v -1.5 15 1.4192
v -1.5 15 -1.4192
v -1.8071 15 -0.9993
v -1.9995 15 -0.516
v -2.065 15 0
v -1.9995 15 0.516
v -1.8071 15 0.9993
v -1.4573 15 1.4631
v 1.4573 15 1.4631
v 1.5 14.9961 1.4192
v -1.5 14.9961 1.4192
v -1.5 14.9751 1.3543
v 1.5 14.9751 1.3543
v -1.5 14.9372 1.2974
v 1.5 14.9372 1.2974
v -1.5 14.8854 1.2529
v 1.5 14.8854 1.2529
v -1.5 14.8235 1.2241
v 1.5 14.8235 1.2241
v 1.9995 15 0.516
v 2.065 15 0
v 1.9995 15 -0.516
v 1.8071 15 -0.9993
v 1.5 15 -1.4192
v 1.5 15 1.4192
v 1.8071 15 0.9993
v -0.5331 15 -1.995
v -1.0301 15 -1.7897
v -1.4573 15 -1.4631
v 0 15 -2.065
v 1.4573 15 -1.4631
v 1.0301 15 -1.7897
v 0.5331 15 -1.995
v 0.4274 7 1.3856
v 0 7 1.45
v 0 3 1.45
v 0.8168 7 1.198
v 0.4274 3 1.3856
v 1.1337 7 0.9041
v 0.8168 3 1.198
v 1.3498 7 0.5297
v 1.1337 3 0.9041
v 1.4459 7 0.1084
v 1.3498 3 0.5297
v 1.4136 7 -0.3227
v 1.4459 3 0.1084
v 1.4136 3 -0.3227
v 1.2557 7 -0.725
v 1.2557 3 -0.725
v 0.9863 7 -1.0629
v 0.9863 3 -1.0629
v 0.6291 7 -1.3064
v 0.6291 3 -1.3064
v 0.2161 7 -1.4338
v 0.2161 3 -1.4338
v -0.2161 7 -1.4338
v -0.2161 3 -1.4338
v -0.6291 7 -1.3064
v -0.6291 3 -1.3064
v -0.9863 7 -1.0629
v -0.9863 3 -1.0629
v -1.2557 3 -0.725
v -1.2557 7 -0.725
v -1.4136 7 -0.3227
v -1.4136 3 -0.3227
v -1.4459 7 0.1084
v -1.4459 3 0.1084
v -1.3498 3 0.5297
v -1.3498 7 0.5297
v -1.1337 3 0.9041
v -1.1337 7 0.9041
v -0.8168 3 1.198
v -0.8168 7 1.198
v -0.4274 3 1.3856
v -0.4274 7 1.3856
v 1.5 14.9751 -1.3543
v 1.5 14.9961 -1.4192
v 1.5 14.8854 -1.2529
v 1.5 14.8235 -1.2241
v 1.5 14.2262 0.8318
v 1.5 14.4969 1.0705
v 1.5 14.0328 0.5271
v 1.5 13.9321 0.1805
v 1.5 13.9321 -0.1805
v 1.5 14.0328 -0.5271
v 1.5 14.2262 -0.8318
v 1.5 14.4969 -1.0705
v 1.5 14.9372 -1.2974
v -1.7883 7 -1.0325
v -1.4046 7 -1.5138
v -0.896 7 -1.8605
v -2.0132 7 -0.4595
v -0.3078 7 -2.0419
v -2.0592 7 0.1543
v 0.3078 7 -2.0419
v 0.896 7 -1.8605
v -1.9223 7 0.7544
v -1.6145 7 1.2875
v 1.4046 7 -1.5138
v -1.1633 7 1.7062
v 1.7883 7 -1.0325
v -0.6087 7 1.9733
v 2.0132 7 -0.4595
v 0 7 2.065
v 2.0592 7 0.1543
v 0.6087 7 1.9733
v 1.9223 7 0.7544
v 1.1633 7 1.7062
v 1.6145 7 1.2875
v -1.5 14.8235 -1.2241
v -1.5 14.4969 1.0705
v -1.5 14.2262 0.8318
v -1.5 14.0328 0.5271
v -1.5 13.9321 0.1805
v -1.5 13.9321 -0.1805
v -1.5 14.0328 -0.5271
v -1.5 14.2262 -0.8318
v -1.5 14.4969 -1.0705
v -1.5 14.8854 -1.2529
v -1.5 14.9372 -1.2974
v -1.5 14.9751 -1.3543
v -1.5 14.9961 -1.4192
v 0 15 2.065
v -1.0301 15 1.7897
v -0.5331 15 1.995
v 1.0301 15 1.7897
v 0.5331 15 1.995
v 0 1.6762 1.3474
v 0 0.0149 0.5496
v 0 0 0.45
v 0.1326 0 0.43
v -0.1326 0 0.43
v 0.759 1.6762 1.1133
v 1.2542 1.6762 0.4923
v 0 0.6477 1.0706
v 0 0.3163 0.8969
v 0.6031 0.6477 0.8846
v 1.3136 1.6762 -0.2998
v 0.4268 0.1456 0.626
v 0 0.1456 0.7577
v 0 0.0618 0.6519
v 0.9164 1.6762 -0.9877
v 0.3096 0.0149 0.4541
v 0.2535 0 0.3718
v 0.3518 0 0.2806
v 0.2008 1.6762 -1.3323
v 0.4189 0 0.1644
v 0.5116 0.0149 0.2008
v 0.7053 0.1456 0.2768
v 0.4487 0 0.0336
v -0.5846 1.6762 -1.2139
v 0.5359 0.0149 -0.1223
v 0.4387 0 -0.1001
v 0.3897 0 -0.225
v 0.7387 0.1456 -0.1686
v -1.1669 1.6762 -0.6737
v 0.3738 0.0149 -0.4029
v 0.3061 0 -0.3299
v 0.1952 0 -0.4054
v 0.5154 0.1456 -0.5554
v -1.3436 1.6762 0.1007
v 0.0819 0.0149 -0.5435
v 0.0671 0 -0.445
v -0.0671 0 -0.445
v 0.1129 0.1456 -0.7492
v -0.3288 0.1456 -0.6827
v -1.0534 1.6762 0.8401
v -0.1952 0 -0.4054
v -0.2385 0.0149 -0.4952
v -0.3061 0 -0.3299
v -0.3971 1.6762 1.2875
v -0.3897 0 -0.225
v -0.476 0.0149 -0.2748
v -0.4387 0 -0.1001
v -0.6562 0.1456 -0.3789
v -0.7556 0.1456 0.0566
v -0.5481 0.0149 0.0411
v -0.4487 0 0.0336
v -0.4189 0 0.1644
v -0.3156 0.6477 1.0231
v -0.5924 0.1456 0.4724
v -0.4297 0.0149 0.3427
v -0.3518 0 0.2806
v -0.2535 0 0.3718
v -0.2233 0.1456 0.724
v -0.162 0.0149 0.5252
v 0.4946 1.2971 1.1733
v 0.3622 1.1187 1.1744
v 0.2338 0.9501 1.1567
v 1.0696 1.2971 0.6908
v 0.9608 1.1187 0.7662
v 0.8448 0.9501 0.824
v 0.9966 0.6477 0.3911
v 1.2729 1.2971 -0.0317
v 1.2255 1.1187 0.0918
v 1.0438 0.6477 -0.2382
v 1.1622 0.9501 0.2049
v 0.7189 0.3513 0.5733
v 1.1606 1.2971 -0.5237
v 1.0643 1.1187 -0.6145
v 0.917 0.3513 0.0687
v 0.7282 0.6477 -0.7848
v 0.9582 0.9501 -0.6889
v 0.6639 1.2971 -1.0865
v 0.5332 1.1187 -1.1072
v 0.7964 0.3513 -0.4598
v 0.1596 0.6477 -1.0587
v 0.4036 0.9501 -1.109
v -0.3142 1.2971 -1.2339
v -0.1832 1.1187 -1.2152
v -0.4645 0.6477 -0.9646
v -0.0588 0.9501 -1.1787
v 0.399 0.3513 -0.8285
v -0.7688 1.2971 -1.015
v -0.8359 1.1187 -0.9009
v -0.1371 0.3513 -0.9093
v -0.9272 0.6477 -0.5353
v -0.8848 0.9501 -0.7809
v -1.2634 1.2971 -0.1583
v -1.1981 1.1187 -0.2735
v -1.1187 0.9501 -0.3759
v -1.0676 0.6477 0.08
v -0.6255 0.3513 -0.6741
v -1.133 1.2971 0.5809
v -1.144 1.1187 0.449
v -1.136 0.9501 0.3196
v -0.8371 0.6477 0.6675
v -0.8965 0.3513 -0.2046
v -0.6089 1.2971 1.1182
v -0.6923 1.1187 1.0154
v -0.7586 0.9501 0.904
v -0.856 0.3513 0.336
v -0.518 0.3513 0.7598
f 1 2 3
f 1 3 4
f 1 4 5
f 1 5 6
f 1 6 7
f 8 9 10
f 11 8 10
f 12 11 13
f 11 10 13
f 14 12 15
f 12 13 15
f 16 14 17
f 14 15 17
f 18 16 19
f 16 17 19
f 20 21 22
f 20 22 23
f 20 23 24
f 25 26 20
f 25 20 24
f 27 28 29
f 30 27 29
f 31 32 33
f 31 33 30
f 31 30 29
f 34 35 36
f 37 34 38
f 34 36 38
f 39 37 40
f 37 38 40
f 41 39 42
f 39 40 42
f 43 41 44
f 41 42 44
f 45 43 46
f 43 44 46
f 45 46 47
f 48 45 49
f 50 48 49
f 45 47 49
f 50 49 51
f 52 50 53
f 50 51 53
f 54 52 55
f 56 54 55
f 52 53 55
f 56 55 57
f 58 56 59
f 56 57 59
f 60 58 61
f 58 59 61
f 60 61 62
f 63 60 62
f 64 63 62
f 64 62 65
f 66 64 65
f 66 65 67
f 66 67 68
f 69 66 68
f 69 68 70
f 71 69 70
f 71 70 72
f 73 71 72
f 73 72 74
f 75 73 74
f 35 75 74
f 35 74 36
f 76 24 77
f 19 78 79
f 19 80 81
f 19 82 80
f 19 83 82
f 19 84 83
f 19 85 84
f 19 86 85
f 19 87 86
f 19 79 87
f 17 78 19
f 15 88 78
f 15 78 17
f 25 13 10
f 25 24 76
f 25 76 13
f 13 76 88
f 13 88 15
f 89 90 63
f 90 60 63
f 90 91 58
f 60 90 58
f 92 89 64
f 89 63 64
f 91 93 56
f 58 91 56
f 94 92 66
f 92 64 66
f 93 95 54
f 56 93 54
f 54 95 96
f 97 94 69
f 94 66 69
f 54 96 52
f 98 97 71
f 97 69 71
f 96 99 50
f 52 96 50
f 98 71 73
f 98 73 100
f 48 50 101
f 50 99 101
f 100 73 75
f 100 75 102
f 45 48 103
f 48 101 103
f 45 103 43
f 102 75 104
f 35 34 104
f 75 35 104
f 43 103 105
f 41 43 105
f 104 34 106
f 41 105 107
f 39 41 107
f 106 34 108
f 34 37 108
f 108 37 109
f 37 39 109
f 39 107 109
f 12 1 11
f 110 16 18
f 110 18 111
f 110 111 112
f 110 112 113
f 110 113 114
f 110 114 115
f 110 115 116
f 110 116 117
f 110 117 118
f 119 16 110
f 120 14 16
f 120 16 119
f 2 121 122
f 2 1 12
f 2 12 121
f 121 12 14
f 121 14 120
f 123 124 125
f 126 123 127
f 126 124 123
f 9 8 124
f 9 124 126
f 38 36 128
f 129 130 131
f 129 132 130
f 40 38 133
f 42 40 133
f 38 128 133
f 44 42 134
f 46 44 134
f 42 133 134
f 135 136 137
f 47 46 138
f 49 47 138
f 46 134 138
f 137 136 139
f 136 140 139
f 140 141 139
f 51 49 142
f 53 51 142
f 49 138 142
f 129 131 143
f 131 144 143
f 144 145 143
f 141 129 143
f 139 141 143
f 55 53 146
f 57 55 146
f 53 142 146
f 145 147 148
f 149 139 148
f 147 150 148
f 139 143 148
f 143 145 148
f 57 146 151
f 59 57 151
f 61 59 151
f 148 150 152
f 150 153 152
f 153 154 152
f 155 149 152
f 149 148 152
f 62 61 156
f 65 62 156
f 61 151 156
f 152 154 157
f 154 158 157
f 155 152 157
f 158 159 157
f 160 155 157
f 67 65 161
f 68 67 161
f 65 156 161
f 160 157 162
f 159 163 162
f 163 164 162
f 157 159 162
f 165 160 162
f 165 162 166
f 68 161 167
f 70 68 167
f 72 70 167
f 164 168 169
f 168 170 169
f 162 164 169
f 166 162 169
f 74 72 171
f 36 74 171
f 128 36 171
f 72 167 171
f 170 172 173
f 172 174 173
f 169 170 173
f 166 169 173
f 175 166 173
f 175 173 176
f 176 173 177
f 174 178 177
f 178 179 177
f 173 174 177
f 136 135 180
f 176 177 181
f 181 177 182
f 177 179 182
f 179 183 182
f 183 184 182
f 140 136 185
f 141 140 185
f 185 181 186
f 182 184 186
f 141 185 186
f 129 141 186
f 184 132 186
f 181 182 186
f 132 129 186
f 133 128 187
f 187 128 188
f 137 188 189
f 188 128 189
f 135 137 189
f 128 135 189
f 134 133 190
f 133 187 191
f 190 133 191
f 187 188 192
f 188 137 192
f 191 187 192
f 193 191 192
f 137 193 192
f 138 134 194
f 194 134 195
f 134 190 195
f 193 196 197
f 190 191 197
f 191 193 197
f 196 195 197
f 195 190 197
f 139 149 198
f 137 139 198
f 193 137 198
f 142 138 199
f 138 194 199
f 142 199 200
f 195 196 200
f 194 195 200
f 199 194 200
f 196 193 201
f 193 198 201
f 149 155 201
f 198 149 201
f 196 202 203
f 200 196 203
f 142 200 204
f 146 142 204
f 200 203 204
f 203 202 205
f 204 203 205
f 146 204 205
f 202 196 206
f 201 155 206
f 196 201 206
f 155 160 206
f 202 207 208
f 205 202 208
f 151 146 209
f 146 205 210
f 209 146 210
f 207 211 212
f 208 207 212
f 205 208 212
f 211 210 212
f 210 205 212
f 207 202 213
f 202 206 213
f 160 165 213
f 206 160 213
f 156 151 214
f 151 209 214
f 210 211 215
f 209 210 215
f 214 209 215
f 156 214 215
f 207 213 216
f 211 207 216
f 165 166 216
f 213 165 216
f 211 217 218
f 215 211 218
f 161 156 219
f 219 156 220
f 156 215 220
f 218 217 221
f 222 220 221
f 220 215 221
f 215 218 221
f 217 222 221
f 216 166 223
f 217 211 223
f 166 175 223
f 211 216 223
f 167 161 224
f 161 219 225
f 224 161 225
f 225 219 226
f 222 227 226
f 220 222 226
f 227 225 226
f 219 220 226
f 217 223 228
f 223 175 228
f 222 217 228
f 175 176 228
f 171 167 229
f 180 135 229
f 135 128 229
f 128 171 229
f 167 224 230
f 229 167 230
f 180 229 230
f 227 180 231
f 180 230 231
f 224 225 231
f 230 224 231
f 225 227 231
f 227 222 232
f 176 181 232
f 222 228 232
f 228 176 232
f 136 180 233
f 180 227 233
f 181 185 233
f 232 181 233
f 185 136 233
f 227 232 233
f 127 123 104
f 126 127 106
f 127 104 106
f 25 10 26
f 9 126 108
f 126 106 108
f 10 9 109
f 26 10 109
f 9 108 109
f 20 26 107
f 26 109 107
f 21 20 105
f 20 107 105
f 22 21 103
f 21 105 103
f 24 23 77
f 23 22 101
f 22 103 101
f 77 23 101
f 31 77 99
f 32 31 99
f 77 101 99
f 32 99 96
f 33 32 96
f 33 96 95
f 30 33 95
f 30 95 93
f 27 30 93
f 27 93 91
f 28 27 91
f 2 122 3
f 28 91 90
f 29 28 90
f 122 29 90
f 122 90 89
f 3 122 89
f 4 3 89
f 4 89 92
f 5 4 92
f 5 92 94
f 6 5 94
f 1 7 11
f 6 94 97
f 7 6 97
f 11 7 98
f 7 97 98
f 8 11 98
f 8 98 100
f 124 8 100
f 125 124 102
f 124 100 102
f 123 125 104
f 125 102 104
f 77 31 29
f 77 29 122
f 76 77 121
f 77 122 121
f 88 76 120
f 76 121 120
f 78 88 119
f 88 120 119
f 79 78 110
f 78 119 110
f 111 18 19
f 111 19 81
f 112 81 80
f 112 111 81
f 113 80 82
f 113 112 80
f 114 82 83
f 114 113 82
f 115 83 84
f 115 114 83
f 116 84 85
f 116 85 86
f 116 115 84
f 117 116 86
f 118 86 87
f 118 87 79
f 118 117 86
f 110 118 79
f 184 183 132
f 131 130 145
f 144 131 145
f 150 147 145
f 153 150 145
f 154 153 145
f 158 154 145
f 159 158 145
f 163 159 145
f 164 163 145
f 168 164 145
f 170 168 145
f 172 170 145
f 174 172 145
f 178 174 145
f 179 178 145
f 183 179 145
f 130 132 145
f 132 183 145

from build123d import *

# Parameters (mm, degrees)
SKETCH1_R               = 1.45
BOSS_EXTRUDE1_DEPTH     = 7
SKETCH3_R               = 2.065
BOSS_EXTRUDE3_DEPTH     = 8
FILLET1_SIZE            = 3
FILLET1_SIZE_2          = 1
CUT_EXTRUDE1_DEPTH      = 1.5
CUT_EXTRUDE1_DEPTH_BACK = 1.5
SKETCH5_R               = 1.280712692
FILLET2_R               = 0.25


with BuildPart() as part:
    # Sketch1 → Boss-Extrude1 (new body)
    with BuildSketch(Plane(origin=(0, 0, 0), x_dir=(1, 0, 0), z_dir=(0, 1, 0))):
        with Locations(Location((0, 0, 0), (0, 0, 270))):
            Circle(SKETCH1_R)
    extrude(amount=BOSS_EXTRUDE1_DEPTH)

    # Sketch3 → Boss-Extrude3 (add)
    with BuildSketch(Plane(origin=(0, 7, 0), x_dir=(1, 0, 0), z_dir=(0, 1, 0))):
        with Locations(Location((0, 0, 0), (0, 0, 270))):
            Circle(SKETCH3_R)
    extrude(amount=BOSS_EXTRUDE3_DEPTH)

    # Fillet1
    # an asymmetric fillet: 3, 1 mm, written as the material it takes off along each edge
    with BuildSketch(Plane(origin=(0, 0, 0), x_dir=(0, 0, 1), z_dir=(-1, 0, 0))) as fillet1_piece_1:
        with BuildLine():
            Bezier((1.45, FILLET1_SIZE), (1.45, 0), (1.45 - FILLET1_SIZE_2, 0), weights=[1, 0.707106781, 1])
            Line((1.45 - FILLET1_SIZE_2, 0), (1.45, 0))
            Line((1.45, 0), (1.45, FILLET1_SIZE))
        make_face()
    revolve(axis=Axis((0, 0, 0), (0, 1, 0)), mode=Mode.SUBTRACT)

    # Sketch5 → Cut-Extrude1 (cut, two sides: drawn at the far end of the back side and taken through both)
    with BuildSketch(Plane(origin=(0, 0, 0), x_dir=(0, 0, -1), z_dir=(1, 0, 0)).offset(-CUT_EXTRUDE1_DEPTH_BACK)):
        with Locations((0, 15.2)):
            Circle(SKETCH5_R)
    extrude(amount=CUT_EXTRUDE1_DEPTH + CUT_EXTRUDE1_DEPTH_BACK, mode=Mode.SUBTRACT)

    # Fillet2
    # the kernel refuses this fillet: 0.25 mm, written as the material it takes off along each edge
    with BuildSketch(Plane(origin=(1.5, 15, 1.265), x_dir=(0, 0, 1), z_dir=(-1, 0, 0)), Plane(origin=(-1.5, 15, -1.265), x_dir=(0, 0, -1), z_dir=(1, 0, 0))) as fillet2_piece_1:
        with BuildLine():
            CenterArc((0.19807257, -0.25), FILLET2_R, 90, 72.903573808)
            Line((-0.040880268, -0.176504823), (-0.045659325, -0.17503492))
            ThreePointArc((-0.045659325, -0.17503492), (-0.022186102, -0.087848028), (-0.004938656, 0.000780815))
            Line((-0.004938656, 0.000780815), (0, 0.005))
            Line((0, 0.005), (0.19807257, 0.005))
            Line((0.19807257, 0.005), (0.19807257, 0))
        make_face()
    extrude(amount=3, mode=Mode.SUBTRACT)


solid = part.part
